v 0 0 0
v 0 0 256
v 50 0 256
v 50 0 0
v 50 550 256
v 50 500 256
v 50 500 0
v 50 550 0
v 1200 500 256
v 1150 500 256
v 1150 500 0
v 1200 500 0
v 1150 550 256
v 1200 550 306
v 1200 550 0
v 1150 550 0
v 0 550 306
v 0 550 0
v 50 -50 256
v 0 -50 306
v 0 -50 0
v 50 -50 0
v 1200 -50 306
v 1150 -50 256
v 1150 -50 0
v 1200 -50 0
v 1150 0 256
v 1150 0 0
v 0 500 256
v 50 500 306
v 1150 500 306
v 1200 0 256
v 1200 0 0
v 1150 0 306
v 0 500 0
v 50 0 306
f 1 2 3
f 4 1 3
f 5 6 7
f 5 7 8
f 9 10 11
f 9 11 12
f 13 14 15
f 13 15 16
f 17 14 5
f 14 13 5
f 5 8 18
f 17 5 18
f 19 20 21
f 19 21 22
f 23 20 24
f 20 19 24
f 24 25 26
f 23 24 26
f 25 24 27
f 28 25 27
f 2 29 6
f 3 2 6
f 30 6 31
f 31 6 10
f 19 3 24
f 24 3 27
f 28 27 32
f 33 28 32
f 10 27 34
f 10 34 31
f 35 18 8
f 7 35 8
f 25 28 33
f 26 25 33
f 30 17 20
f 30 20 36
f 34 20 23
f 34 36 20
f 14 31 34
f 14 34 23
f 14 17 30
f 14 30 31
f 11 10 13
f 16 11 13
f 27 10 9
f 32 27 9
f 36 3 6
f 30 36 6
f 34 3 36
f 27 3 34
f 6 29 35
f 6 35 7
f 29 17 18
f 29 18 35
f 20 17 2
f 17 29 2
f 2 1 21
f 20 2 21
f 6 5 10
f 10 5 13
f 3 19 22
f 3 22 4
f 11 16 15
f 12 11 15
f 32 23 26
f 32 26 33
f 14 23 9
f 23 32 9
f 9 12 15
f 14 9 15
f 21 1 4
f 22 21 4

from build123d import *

# Parameters (mm, degrees)
F0_W     = 50
F0_H     = 50
F1_DEPTH = 256
F2_W     = 1100
F2_H     = 500
F3_DEPTH = 50


with BuildPart() as f1:
    # F0 (on Top) → F1 (new body)
    with BuildSketch(Plane.XY):
        with Locations((25, -25)):
            Rectangle(F0_W, F0_H)
    extrude(amount=F1_DEPTH)



with BuildPart() as f1b:
    # F0 (on Top) → F1, piece 2 (new body)
    with BuildSketch(Plane.XY):
        with Locations((25, 525)):
            Rectangle(F0_W, F0_H)
    extrude(amount=F1_DEPTH)


with BuildPart() as f1c:
    # F0 (on Top) → F1, piece 3 (new body)
    with BuildSketch(Plane.XY):
        with Locations((1175, -25)):
            Rectangle(F0_W, F0_H)
    extrude(amount=F1_DEPTH)


with BuildPart() as f1d:
    # F0 (on Top) → F1, piece 4 (new body)
    with BuildSketch(Plane.XY):
        with Locations((1175, 525)):
            Rectangle(F0_W, F0_H)
    extrude(amount=F1_DEPTH)


with BuildPart() as f1_1:
    add(f1.part)

    add(f1b.part)  # F3 merges F1b

    add(f1c.part)  # F3 merges F1c

    add(f1d.part)  # F3 merges F1d
    # F2 (on face) → F3 (join)
    with BuildSketch(Plane.XY.offset(256)):
        Polygon((0, 0), (0, -50), (50, -50), (1150, -50), (1200, -50), (1200, 0), (1200, 500), (1200, 550), (1150, 550), (50, 550), (0, 550), (0, 500), align=None)
        with Locations((600, 250)):
            Rectangle(F2_W, F2_H, mode=Mode.SUBTRACT)
    extrude(amount=F3_DEPTH)


solid = f1_1.part
